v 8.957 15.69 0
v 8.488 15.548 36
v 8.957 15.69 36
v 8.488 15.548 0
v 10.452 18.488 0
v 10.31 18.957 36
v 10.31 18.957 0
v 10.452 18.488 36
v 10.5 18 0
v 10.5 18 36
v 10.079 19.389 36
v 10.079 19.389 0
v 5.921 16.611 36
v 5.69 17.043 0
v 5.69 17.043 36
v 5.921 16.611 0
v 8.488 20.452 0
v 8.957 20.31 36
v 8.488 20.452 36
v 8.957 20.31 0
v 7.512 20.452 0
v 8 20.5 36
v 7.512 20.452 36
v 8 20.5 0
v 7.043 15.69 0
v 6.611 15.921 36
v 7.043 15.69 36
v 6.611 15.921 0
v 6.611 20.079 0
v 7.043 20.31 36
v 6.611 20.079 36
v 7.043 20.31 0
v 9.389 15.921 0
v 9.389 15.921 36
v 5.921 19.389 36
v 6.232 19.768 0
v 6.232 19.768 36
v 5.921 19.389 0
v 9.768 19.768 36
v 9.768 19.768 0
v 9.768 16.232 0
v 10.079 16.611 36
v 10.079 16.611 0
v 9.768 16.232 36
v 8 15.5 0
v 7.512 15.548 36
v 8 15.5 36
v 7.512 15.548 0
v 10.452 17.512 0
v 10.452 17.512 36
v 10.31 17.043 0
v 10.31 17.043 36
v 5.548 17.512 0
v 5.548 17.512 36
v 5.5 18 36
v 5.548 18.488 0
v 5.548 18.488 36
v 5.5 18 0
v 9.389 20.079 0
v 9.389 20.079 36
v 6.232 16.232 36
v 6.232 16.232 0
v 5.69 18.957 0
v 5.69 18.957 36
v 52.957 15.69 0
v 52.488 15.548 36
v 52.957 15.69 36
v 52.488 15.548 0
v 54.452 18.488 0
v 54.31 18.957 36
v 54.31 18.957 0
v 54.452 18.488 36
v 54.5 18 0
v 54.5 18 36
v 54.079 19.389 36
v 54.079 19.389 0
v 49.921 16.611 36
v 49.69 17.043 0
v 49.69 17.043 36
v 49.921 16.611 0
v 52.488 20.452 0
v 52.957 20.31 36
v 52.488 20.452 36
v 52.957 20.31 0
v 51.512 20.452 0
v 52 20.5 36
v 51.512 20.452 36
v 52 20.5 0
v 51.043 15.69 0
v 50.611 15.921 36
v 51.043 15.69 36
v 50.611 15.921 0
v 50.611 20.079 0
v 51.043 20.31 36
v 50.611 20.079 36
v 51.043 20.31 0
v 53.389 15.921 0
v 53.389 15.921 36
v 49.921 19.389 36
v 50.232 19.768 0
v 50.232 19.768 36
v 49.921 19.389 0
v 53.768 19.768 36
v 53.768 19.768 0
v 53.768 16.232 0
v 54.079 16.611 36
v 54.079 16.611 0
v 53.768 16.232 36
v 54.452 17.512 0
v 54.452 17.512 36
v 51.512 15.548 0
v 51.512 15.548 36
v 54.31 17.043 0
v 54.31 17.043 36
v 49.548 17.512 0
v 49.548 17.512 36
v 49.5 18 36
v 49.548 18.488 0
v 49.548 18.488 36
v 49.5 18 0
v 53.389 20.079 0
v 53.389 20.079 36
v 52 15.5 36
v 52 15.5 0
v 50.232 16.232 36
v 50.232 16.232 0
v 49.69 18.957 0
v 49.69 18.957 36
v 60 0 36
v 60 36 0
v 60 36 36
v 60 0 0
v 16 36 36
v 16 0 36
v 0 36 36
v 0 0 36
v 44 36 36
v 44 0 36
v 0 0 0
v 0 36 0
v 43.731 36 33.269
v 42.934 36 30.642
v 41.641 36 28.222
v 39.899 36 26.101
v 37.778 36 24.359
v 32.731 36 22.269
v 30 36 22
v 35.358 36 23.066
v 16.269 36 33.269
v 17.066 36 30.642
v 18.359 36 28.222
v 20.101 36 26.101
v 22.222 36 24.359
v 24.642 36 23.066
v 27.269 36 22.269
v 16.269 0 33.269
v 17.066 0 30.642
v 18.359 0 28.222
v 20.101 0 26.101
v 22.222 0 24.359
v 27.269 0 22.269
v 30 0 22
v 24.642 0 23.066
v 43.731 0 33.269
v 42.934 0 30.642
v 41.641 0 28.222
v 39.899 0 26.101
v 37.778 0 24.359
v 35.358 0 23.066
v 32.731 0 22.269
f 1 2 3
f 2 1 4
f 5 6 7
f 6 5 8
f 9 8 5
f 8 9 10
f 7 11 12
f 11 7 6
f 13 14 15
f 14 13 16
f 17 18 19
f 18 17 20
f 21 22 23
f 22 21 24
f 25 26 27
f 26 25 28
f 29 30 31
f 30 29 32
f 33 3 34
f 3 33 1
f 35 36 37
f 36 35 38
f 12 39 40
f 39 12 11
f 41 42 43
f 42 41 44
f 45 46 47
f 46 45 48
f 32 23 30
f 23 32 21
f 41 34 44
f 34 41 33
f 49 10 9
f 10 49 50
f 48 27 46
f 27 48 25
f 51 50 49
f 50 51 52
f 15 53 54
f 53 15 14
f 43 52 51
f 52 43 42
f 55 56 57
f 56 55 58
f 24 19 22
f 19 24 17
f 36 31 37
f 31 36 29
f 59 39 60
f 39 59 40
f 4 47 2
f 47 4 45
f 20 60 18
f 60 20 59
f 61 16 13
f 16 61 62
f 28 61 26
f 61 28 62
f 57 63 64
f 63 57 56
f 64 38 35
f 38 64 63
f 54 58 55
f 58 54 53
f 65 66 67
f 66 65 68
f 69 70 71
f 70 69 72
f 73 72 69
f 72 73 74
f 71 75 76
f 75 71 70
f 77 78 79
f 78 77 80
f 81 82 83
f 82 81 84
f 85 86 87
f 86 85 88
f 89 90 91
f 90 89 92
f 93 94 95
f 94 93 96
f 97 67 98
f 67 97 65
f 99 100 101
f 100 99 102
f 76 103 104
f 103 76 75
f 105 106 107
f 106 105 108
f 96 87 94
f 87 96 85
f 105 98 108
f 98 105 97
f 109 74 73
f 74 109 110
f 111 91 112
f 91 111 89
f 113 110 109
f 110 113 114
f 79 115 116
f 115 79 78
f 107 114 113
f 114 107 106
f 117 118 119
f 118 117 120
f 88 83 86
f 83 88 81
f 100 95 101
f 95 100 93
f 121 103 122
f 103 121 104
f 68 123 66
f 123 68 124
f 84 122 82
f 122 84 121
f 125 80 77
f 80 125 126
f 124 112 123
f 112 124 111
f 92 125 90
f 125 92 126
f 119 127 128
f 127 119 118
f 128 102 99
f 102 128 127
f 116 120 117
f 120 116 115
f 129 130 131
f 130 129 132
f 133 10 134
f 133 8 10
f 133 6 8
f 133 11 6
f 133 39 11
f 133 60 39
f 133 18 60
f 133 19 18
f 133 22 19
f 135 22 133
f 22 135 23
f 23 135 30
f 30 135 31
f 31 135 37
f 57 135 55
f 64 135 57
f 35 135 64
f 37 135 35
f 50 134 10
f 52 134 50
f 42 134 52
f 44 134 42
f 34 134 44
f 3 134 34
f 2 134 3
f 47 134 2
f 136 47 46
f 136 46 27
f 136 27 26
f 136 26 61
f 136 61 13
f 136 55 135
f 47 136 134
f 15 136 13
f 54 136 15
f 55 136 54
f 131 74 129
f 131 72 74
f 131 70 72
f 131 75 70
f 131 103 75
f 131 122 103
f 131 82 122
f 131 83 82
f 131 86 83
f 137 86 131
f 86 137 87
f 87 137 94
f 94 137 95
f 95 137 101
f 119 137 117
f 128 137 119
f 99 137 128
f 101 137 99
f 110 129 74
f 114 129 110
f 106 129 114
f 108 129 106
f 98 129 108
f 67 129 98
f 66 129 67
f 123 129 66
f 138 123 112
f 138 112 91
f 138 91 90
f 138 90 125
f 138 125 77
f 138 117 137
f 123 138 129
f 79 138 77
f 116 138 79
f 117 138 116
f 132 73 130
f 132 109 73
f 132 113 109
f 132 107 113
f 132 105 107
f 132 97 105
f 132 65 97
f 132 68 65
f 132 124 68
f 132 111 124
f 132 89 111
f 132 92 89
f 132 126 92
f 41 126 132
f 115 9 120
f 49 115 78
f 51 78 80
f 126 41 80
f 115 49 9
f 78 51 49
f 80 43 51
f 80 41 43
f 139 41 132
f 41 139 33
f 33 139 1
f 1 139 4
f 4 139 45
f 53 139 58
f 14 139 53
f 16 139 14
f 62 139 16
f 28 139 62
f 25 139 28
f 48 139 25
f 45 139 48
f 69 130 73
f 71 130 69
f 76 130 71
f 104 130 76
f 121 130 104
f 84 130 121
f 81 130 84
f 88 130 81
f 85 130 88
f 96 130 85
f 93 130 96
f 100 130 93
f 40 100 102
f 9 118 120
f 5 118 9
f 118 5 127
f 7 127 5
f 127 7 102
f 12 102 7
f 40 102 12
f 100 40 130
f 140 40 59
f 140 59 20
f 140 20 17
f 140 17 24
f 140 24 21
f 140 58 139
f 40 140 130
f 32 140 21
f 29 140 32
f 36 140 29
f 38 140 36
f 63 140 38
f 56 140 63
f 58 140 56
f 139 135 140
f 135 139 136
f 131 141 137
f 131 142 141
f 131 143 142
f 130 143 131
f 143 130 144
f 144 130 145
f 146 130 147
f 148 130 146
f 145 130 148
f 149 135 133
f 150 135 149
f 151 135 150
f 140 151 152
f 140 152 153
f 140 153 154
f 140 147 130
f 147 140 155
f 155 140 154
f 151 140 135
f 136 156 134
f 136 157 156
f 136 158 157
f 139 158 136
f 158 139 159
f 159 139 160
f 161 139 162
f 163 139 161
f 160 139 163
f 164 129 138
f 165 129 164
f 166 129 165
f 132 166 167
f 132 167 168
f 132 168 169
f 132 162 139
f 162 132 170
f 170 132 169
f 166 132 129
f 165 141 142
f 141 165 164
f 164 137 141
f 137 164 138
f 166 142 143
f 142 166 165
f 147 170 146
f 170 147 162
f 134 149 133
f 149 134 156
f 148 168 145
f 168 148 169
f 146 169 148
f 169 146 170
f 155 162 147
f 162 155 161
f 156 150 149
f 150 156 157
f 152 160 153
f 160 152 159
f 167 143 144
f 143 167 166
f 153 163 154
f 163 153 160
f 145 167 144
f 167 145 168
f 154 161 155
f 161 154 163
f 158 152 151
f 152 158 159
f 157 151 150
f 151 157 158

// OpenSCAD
$fn = 32;

// ----------------------------------------------------------------------
// Saddle clamp: plain shaft clamp
// ----------------------------------------------------------------------

// --- parameters (mm) ---
blk_l = 60;               // block length, X
blk_w = 36;               // block width, Y
blk_h = 36;               // block height
clamp_r = 14;             // shaft groove radius
hole_r = 2.5;             // bolt hole radius
hole_m = 8;               // bolt hole margin from the ends
fit_tol = 0.02;           // tolerance for press fits, mm
free_tol = 0.2;           // tolerance for clearance fits, mm

saw_depth = clamp_r + 3;  // saw kerf depth

difference() {
  cube([blk_l, blk_w, blk_h]);
  translate([blk_l / 2, -1, blk_h])
    rotate([-90, 0, 0])
      cylinder(h = blk_w + 2, r = clamp_r);
  for (sx = [0, 1])
    translate([sx ? blk_l - hole_m : hole_m, blk_w / 2, -1])
      cylinder(r = hole_r, h = blk_h + 2);
}
